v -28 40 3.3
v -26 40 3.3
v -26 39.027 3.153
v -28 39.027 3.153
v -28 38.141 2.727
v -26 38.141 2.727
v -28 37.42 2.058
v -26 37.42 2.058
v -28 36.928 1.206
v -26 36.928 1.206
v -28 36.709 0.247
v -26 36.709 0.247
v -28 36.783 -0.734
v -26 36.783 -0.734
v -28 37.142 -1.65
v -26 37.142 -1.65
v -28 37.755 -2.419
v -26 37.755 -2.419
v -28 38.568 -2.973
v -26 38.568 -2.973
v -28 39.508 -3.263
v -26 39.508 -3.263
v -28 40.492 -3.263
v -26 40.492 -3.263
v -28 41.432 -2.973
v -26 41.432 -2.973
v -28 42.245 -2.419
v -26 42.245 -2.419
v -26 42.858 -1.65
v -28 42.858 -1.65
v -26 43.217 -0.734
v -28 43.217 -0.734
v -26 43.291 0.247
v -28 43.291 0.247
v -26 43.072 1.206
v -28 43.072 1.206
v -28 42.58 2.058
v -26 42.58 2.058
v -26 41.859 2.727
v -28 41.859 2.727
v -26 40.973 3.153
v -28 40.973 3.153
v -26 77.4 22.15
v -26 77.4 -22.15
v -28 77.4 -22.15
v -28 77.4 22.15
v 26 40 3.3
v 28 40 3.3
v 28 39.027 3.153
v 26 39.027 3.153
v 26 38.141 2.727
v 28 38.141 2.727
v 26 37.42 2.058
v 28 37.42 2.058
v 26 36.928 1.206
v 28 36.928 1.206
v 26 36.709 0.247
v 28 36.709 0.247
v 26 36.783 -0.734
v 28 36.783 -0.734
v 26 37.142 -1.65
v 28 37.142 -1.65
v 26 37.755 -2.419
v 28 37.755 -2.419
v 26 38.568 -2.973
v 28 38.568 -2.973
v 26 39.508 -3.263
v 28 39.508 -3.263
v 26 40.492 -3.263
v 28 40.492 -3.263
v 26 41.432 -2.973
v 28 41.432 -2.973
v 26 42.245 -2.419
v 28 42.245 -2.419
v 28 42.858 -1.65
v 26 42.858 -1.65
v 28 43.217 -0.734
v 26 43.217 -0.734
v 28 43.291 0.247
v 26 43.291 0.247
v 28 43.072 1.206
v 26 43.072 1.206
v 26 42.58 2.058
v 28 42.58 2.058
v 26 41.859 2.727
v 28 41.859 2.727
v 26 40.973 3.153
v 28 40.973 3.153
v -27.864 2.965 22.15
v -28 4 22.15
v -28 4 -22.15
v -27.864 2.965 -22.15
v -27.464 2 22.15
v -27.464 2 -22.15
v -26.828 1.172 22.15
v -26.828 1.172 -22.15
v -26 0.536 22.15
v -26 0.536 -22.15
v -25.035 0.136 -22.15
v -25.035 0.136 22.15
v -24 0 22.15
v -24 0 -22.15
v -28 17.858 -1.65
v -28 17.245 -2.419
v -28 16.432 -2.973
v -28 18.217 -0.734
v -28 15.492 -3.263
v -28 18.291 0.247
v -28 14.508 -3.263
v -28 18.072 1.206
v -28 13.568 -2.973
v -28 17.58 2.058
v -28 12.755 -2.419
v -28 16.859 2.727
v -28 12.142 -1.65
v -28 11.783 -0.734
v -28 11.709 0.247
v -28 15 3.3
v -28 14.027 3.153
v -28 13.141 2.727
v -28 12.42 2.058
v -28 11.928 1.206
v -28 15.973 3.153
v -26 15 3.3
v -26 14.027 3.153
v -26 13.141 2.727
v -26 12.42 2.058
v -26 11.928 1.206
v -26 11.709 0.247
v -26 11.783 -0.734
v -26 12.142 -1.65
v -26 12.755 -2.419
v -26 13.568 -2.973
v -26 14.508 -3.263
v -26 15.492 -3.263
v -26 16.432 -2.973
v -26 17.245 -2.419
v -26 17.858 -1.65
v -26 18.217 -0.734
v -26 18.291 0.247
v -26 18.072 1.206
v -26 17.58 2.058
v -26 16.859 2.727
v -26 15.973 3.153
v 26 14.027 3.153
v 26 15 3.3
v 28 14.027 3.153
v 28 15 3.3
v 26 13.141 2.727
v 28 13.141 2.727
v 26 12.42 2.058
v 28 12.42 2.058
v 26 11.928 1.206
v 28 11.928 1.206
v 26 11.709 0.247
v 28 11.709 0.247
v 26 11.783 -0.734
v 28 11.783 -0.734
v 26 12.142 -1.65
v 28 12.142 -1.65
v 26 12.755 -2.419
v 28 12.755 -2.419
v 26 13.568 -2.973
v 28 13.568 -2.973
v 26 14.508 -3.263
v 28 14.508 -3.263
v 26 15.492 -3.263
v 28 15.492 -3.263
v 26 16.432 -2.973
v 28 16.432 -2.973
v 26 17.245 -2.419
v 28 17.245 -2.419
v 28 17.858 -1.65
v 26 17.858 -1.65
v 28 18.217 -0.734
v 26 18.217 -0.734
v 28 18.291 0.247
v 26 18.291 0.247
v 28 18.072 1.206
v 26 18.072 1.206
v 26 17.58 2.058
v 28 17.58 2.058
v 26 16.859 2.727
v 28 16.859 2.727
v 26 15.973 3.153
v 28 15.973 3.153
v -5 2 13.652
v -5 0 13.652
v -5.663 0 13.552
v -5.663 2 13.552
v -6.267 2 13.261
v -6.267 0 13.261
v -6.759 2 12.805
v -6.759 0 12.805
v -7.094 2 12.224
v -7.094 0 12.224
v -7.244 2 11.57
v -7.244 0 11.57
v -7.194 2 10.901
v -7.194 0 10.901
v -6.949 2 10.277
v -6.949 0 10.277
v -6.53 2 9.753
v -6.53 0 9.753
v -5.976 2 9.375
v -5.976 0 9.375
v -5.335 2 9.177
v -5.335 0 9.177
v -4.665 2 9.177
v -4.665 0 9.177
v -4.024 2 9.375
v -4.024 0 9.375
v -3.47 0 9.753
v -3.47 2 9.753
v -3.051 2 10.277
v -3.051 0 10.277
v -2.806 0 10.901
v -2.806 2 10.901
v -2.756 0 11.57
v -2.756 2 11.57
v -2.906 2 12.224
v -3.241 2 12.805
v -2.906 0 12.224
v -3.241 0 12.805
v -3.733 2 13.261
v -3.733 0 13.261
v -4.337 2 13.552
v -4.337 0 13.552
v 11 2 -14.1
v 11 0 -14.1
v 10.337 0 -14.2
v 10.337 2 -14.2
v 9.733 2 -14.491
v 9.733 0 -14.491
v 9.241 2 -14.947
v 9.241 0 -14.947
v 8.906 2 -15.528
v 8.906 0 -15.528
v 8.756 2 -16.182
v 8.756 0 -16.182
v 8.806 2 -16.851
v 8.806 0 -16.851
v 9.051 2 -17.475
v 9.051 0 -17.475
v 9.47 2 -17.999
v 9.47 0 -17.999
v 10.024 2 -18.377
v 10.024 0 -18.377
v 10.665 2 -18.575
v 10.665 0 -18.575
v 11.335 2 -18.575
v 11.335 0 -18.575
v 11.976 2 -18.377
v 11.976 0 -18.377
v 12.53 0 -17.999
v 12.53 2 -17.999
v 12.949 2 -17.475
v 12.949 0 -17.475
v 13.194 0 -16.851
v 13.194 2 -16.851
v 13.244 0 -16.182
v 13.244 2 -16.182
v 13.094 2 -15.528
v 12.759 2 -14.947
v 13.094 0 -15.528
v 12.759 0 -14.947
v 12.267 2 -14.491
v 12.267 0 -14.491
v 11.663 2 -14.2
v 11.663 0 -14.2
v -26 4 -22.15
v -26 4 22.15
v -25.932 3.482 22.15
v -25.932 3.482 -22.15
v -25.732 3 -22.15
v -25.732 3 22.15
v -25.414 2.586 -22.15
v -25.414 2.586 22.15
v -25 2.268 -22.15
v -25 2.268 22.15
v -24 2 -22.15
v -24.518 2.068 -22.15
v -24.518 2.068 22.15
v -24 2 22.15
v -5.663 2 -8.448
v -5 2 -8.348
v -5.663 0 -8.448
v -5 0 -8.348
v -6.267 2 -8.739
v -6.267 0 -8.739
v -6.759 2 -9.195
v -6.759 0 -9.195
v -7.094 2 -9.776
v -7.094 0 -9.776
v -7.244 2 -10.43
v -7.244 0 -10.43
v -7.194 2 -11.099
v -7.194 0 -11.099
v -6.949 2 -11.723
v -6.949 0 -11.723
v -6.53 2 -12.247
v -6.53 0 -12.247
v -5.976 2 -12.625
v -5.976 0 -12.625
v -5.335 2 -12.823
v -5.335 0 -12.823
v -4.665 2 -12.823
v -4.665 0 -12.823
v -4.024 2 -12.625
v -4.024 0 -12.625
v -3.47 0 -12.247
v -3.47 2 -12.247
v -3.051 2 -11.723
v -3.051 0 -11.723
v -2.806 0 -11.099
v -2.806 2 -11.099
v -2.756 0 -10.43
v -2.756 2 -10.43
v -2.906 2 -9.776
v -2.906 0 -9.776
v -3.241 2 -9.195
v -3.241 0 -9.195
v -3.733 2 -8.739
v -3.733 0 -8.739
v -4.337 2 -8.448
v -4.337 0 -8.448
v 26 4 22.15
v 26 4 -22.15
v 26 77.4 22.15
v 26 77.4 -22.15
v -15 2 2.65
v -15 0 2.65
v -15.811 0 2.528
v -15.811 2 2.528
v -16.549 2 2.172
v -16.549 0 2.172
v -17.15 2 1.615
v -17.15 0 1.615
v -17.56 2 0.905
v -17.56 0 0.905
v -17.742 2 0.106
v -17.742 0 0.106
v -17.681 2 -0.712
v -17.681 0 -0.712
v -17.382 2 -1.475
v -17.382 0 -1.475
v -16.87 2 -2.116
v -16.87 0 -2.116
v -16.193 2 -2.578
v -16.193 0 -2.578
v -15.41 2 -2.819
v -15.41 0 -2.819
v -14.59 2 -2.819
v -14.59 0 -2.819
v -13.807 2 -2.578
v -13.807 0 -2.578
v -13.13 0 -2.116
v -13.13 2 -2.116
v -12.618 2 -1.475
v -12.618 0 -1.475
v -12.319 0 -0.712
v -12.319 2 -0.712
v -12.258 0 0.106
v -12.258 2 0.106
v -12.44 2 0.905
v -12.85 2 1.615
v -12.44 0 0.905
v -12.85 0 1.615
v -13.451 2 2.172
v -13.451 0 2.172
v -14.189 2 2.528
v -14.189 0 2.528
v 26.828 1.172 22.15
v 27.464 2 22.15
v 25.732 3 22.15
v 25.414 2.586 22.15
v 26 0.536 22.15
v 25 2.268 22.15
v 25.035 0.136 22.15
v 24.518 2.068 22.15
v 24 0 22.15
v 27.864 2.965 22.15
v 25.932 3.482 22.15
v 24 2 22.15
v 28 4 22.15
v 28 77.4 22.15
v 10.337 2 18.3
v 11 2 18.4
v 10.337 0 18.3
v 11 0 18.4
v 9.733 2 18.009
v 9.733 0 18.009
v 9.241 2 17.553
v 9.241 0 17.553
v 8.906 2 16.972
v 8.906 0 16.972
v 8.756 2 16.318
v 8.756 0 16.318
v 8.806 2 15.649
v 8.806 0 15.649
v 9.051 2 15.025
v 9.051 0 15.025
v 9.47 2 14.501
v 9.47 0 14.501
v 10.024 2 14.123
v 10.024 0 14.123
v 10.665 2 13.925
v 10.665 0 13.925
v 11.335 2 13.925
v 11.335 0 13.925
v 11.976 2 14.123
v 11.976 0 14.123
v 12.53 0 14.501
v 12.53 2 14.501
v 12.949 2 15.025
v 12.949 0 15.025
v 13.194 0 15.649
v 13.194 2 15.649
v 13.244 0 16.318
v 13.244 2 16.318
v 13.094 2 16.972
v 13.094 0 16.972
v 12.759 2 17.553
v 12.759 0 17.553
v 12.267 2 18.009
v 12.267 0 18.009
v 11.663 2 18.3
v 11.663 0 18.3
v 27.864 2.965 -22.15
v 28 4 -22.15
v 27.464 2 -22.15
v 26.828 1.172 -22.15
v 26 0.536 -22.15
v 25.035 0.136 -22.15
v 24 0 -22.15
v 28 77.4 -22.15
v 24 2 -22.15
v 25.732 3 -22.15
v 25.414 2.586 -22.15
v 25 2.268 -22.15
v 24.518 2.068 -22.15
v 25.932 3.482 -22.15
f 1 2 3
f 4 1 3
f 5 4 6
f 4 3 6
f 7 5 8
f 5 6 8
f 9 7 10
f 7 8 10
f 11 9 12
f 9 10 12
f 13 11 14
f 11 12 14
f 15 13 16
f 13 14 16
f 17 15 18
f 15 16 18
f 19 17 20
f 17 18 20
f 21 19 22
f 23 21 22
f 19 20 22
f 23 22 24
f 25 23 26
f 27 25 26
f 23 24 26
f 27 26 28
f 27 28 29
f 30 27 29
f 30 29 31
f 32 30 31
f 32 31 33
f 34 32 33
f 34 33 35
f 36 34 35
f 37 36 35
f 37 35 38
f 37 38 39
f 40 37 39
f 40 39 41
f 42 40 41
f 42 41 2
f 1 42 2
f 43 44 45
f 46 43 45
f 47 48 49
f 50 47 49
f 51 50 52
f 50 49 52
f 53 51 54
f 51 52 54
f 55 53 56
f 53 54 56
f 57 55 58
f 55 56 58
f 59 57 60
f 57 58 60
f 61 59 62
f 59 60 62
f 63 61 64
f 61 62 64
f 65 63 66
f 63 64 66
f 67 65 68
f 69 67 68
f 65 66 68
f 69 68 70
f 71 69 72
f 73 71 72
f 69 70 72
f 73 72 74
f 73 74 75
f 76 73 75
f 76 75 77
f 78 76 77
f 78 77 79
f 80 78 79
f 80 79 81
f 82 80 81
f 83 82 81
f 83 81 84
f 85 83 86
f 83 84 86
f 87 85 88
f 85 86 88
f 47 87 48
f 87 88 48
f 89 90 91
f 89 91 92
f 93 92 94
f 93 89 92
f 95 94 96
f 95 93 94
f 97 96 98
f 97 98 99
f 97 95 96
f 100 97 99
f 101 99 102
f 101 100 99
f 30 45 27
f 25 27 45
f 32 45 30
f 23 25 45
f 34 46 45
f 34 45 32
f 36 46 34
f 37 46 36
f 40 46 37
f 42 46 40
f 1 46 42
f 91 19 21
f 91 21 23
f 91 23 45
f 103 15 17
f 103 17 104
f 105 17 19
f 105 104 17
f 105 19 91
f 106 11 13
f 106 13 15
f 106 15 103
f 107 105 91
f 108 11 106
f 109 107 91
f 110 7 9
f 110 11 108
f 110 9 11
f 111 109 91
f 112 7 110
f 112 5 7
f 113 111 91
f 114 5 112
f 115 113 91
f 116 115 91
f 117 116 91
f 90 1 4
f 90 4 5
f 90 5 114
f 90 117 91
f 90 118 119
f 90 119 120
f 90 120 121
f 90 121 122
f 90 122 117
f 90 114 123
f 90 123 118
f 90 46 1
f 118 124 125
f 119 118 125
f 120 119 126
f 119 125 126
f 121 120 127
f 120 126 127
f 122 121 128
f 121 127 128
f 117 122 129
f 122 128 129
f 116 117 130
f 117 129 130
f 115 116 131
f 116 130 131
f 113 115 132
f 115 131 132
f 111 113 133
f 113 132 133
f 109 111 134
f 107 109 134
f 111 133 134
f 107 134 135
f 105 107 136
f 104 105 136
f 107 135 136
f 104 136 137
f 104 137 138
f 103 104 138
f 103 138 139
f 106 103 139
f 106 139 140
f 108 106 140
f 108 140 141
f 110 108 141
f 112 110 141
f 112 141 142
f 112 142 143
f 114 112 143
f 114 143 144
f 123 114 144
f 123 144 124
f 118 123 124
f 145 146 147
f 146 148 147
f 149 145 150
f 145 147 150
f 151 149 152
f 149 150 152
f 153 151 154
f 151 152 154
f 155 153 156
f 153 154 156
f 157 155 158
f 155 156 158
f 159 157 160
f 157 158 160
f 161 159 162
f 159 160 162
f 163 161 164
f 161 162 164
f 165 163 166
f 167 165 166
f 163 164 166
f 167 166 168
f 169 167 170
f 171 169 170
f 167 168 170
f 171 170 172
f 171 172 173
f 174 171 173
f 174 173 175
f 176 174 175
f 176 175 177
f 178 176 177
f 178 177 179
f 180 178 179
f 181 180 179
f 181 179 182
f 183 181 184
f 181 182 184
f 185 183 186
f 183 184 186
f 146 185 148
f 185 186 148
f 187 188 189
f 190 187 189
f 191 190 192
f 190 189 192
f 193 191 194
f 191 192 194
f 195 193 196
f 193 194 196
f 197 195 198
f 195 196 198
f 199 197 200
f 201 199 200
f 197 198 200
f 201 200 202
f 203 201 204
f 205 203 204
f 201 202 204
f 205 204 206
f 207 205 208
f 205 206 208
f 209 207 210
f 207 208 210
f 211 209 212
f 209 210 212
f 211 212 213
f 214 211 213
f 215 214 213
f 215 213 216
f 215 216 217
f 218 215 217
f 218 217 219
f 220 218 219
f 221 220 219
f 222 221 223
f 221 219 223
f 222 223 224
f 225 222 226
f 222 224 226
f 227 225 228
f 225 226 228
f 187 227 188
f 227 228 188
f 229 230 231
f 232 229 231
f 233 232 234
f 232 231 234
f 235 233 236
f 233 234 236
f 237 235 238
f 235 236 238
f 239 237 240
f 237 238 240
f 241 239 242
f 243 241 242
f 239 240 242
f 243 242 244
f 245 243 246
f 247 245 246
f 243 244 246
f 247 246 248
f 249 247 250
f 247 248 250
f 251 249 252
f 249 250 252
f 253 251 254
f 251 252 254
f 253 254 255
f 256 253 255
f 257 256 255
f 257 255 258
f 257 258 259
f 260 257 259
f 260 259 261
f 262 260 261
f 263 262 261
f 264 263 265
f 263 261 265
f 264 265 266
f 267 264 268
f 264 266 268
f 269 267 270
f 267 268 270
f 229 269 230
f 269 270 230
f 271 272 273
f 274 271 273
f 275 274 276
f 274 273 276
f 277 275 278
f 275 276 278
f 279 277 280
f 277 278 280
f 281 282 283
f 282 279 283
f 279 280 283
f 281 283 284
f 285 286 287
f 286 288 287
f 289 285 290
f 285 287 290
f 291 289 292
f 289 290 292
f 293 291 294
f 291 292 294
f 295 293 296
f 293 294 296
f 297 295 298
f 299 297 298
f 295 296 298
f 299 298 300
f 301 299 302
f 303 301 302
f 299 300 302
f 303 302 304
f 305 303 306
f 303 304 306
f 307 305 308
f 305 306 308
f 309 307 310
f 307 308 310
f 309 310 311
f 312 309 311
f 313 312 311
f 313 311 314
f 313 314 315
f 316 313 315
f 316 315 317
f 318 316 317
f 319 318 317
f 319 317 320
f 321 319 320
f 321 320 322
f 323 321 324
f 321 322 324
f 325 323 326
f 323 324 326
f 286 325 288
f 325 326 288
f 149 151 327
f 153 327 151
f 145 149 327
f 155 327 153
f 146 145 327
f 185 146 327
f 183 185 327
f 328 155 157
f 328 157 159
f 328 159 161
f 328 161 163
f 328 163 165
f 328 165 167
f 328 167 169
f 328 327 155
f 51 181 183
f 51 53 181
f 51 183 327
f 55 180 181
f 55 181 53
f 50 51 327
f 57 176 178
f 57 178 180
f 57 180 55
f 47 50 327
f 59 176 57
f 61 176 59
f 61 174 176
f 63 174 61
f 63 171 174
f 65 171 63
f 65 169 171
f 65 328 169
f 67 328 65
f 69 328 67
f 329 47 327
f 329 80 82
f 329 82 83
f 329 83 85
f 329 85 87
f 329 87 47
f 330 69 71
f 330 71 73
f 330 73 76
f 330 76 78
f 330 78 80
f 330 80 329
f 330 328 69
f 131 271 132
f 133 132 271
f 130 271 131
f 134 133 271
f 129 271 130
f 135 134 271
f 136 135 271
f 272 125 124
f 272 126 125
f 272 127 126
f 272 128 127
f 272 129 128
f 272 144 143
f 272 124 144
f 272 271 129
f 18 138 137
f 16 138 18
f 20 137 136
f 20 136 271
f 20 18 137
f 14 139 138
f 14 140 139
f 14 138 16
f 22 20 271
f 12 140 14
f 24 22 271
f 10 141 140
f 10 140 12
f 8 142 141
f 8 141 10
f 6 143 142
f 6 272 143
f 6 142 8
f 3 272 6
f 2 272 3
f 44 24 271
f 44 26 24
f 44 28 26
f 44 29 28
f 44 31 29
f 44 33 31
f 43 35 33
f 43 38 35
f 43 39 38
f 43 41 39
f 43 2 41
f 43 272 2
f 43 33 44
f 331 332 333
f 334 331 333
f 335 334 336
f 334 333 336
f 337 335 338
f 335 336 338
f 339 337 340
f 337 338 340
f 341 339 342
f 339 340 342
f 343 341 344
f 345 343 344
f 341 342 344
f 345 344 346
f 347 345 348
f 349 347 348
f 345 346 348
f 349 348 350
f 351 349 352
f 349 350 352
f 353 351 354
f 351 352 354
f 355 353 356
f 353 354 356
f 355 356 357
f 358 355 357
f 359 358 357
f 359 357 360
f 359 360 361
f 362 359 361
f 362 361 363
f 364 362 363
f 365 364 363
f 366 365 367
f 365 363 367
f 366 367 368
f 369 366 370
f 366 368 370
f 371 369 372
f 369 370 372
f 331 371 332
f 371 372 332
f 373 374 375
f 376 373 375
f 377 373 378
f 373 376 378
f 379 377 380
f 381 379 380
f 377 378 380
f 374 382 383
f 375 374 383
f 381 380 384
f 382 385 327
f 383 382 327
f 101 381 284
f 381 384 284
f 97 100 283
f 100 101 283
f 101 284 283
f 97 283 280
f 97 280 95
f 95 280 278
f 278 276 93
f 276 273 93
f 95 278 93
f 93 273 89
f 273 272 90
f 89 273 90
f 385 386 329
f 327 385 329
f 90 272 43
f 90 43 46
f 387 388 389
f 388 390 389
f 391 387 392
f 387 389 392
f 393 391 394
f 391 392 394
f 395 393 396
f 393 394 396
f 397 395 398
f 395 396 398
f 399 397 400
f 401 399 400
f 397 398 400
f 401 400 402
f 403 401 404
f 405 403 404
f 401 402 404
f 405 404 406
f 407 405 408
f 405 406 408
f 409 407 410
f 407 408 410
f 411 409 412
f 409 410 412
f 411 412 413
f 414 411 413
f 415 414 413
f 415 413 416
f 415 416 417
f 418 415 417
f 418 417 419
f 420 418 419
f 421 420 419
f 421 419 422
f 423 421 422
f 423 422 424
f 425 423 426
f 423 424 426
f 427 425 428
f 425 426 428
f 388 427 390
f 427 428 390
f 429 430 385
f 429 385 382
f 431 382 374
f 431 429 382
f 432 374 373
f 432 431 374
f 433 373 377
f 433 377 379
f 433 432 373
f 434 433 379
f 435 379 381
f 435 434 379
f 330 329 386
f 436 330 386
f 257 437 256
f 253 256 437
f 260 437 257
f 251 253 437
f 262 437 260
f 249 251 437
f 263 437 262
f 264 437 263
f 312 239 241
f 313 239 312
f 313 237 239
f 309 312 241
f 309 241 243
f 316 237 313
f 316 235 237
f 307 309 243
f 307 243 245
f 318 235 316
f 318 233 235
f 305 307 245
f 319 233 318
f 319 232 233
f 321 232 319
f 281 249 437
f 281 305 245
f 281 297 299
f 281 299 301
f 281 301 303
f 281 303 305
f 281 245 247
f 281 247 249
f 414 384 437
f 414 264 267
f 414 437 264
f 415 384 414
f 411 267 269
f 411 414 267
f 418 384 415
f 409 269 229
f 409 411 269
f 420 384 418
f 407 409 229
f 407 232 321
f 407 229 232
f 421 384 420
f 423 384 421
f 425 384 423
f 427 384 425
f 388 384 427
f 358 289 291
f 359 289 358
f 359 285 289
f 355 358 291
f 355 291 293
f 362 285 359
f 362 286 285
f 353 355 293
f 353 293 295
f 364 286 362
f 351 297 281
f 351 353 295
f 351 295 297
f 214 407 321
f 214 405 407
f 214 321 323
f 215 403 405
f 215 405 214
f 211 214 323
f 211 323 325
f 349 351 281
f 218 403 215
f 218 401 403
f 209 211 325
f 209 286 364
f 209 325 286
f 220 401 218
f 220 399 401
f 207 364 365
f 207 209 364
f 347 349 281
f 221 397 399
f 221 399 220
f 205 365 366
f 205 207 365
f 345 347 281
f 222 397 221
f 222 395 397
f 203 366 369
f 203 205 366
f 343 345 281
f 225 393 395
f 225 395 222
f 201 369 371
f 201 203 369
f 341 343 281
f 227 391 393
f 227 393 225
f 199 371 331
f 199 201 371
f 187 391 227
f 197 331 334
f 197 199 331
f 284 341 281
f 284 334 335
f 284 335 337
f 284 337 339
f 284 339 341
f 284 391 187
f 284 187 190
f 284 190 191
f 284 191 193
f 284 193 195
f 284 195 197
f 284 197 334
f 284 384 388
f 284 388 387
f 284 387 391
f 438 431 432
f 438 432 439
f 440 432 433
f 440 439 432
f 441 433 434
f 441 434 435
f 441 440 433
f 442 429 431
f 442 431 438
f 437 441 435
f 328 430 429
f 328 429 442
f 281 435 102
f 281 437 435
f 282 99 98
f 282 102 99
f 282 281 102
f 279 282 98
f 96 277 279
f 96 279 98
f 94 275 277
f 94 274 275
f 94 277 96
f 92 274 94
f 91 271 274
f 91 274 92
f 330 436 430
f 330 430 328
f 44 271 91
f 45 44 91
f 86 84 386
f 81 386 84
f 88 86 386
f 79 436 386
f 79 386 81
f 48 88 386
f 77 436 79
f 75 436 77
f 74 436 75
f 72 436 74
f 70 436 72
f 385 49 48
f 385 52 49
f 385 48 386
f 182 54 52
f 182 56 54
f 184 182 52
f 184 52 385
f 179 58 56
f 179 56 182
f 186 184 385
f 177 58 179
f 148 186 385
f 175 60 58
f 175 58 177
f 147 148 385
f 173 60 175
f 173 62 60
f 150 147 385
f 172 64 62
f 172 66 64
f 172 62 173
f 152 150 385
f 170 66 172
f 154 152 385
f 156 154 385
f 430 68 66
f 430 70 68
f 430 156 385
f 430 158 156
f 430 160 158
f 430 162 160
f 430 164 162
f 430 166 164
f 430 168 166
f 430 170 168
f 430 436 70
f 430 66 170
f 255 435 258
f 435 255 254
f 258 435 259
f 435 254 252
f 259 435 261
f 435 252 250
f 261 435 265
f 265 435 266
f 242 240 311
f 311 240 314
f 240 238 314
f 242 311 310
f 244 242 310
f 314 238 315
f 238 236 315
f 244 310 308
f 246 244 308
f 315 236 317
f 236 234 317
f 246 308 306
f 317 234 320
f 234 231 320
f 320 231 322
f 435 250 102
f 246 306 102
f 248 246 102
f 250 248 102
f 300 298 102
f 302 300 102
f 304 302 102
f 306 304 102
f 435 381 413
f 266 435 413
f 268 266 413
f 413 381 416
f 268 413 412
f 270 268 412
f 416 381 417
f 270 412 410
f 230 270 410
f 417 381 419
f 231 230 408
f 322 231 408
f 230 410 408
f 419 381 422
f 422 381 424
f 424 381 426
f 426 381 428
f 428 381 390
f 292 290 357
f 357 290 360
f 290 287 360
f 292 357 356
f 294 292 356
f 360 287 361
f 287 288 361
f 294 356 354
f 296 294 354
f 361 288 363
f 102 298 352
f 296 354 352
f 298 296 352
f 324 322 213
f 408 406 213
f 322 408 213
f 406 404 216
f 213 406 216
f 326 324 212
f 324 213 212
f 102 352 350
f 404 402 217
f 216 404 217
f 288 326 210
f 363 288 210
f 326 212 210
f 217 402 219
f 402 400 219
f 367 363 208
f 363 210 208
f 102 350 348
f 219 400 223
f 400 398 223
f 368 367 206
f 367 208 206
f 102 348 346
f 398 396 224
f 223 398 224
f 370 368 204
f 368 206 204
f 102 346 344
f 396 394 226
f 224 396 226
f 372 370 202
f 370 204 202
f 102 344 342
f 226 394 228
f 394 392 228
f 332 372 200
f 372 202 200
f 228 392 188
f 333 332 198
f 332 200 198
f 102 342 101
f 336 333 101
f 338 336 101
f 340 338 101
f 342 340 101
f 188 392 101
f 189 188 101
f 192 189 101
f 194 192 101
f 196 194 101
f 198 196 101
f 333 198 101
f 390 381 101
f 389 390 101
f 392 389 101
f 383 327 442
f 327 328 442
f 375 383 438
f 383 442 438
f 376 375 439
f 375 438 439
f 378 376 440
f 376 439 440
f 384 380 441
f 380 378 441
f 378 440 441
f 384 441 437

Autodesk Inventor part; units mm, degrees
ref_plane "YZ Plane" through (0, 0, 0) normal (1, 0, 0) x (0, 1, 0)
ref_plane "XZ Plane" through (0, 0, 0) normal (0, 1, 0) x (-1, 0, 0)
ref_plane "XY Plane" through (0, 0, 0) normal (0, 0, 1) x (1, 0, 0)
sketch "Szkic1" plane through (0, 0, 0) normal (0, 1, 0) x (-1, 0, 0)
  line L0 (-28, -22.15) -> (28, -22.15)
  line L1 (28, -22.15) -> (28, 22.15)
  line L2 (28, 22.15) -> (-28, 22.15)
  line L3 (-28, 22.15) -> (-28, -22.15)
  line L4 (-28, -22.15) -> (28, 22.15) construction
  line L5 (28, -22.15) -> (-28, 22.15) construction
  point P0 (0, 0)
  dimension "d0" = 56
  dimension "d1" = 44.3
extrude "Płyta1" add sketch "Szkic1" along normal blind 2
sketch "Szkic4" plane through (26, 0, -22.15) normal (1, 0, 0) x (0, 1, 0)
  line L0 (0, 44.3) -> (0, 0)
  line L1 (0, 0) -> (77.4, 0)
  line L2 (77.4, 0) -> (77.4, 44.3)
  line L3 (77.4, 44.3) -> (0, 44.3)
edge flange "Kołnierz3" height 77.4 angle 90 thickness 2 bend radius 2 thickness toward (1, 0, 0) relief tear relief width 2 relief depth 1 corner gap 2 corner form 0 edges at (28, 2, 0) (-28, 2, 0) wall of the first edge with corners at (26, 0, 22.15) (26, 0, -22.15) (26, 77.4, -22.15) (26, 77.4, 22.15)
bend "Zagięcie3"
corner "Narożnik3"
sketch "Szkic9" plane through (-28, 77.4, -22.15) normal (-1, 0, 0) x (0, 0, 1)
  point P0 (22.15, -37.4)
  point P1 (22.15, -62.4)
hole "Otwór4" at (-28, 40, 0) at (-28, 15, 0) direction (1, 0, 0) diameter 6.6 depth 2
sketch "Szkic10" plane through (26, 77.4, -22.15) normal (-1, 0, 0) x (0, 0, 1)
  point P0 (22.15, -37.4)
  point P1 (22.15, -62.4)
hole "Otwór5" at (26, 40, 0) at (26, 15, 0) direction (1, 0, 0) diameter 6.6 depth 2
sketch "Szkic11" plane through (0, 2, 0) normal (0, 1, 0) x (1, 0, 0)
  point P0 (11, -16.15)
  point P1 (11, 16.35)
hole "Otwór6" at (11, 2, 16.15) at (11, 2, -16.35) direction (0, -1, 0) diameter 4.5 end through all
sketch "Szkic12" plane through (0, 2, 0) normal (0, 1, 0) x (1, 0, 0)
  point P0 (-5, 10.5981)
  point P1 (-5, -11.4019)
hole "Otwór7" at (-5, 2, -10.5981) at (-5, 2, 11.4019) direction (0, -1, 0) diameter 4.5 end through all
sketch "Szkic13" plane through (0, 2, 0) normal (0, 1, 0) x (1, 0, 0)
  point P0 (-15, 0.1)
hole "Otwór8" at (-15, 2, -0.1) direction (0, -1, 0) diameter 5.5 end through all
equation "\"d2\" = Grubość"
equation "\"d23\" = SzerokośćGięciaPodcięcia"
equation "\"d24\" = GłębokośćGięciaPodcięcia"
equation "\"d25\" = MinimalnaPozostałość"
equation "\"d26\" = PromieńPrzejścia"
equation "\"d29\" = PromieńGięcia"
equation "\"d30\" = RozmiarPodcięciaNarożnika"
equation "\"d31\" = Wielk_odstępu"
equation "\"d32\" = Rozmiar_promienia_Jacobiego"
equation "\"PromieńGięcia\" = Grubość"
equation "\"SzerokośćGięciaPodcięcia\" = Grubość"
equation "\"GłębokośćGięciaPodcięcia\" = 0.5 * Grubość"
equation "\"RozmiarPodcięciaNarożnika\" = 4 * Grubość"
equation "\"MinimalnaPozostałość\" = 2 * Grubość"
equation "\"PromieńPrzejścia\" = PromieńGięcia"
equation "\"Rozmiar_promienia_Jacobiego\" = PromieńGięcia"
equation "\"Wielk_odstępu\" = Grubość"
equation "\"Grubość\" = 2"
properties part number "RR-PCSS-W3M2" material "Stal nierdzewna"
